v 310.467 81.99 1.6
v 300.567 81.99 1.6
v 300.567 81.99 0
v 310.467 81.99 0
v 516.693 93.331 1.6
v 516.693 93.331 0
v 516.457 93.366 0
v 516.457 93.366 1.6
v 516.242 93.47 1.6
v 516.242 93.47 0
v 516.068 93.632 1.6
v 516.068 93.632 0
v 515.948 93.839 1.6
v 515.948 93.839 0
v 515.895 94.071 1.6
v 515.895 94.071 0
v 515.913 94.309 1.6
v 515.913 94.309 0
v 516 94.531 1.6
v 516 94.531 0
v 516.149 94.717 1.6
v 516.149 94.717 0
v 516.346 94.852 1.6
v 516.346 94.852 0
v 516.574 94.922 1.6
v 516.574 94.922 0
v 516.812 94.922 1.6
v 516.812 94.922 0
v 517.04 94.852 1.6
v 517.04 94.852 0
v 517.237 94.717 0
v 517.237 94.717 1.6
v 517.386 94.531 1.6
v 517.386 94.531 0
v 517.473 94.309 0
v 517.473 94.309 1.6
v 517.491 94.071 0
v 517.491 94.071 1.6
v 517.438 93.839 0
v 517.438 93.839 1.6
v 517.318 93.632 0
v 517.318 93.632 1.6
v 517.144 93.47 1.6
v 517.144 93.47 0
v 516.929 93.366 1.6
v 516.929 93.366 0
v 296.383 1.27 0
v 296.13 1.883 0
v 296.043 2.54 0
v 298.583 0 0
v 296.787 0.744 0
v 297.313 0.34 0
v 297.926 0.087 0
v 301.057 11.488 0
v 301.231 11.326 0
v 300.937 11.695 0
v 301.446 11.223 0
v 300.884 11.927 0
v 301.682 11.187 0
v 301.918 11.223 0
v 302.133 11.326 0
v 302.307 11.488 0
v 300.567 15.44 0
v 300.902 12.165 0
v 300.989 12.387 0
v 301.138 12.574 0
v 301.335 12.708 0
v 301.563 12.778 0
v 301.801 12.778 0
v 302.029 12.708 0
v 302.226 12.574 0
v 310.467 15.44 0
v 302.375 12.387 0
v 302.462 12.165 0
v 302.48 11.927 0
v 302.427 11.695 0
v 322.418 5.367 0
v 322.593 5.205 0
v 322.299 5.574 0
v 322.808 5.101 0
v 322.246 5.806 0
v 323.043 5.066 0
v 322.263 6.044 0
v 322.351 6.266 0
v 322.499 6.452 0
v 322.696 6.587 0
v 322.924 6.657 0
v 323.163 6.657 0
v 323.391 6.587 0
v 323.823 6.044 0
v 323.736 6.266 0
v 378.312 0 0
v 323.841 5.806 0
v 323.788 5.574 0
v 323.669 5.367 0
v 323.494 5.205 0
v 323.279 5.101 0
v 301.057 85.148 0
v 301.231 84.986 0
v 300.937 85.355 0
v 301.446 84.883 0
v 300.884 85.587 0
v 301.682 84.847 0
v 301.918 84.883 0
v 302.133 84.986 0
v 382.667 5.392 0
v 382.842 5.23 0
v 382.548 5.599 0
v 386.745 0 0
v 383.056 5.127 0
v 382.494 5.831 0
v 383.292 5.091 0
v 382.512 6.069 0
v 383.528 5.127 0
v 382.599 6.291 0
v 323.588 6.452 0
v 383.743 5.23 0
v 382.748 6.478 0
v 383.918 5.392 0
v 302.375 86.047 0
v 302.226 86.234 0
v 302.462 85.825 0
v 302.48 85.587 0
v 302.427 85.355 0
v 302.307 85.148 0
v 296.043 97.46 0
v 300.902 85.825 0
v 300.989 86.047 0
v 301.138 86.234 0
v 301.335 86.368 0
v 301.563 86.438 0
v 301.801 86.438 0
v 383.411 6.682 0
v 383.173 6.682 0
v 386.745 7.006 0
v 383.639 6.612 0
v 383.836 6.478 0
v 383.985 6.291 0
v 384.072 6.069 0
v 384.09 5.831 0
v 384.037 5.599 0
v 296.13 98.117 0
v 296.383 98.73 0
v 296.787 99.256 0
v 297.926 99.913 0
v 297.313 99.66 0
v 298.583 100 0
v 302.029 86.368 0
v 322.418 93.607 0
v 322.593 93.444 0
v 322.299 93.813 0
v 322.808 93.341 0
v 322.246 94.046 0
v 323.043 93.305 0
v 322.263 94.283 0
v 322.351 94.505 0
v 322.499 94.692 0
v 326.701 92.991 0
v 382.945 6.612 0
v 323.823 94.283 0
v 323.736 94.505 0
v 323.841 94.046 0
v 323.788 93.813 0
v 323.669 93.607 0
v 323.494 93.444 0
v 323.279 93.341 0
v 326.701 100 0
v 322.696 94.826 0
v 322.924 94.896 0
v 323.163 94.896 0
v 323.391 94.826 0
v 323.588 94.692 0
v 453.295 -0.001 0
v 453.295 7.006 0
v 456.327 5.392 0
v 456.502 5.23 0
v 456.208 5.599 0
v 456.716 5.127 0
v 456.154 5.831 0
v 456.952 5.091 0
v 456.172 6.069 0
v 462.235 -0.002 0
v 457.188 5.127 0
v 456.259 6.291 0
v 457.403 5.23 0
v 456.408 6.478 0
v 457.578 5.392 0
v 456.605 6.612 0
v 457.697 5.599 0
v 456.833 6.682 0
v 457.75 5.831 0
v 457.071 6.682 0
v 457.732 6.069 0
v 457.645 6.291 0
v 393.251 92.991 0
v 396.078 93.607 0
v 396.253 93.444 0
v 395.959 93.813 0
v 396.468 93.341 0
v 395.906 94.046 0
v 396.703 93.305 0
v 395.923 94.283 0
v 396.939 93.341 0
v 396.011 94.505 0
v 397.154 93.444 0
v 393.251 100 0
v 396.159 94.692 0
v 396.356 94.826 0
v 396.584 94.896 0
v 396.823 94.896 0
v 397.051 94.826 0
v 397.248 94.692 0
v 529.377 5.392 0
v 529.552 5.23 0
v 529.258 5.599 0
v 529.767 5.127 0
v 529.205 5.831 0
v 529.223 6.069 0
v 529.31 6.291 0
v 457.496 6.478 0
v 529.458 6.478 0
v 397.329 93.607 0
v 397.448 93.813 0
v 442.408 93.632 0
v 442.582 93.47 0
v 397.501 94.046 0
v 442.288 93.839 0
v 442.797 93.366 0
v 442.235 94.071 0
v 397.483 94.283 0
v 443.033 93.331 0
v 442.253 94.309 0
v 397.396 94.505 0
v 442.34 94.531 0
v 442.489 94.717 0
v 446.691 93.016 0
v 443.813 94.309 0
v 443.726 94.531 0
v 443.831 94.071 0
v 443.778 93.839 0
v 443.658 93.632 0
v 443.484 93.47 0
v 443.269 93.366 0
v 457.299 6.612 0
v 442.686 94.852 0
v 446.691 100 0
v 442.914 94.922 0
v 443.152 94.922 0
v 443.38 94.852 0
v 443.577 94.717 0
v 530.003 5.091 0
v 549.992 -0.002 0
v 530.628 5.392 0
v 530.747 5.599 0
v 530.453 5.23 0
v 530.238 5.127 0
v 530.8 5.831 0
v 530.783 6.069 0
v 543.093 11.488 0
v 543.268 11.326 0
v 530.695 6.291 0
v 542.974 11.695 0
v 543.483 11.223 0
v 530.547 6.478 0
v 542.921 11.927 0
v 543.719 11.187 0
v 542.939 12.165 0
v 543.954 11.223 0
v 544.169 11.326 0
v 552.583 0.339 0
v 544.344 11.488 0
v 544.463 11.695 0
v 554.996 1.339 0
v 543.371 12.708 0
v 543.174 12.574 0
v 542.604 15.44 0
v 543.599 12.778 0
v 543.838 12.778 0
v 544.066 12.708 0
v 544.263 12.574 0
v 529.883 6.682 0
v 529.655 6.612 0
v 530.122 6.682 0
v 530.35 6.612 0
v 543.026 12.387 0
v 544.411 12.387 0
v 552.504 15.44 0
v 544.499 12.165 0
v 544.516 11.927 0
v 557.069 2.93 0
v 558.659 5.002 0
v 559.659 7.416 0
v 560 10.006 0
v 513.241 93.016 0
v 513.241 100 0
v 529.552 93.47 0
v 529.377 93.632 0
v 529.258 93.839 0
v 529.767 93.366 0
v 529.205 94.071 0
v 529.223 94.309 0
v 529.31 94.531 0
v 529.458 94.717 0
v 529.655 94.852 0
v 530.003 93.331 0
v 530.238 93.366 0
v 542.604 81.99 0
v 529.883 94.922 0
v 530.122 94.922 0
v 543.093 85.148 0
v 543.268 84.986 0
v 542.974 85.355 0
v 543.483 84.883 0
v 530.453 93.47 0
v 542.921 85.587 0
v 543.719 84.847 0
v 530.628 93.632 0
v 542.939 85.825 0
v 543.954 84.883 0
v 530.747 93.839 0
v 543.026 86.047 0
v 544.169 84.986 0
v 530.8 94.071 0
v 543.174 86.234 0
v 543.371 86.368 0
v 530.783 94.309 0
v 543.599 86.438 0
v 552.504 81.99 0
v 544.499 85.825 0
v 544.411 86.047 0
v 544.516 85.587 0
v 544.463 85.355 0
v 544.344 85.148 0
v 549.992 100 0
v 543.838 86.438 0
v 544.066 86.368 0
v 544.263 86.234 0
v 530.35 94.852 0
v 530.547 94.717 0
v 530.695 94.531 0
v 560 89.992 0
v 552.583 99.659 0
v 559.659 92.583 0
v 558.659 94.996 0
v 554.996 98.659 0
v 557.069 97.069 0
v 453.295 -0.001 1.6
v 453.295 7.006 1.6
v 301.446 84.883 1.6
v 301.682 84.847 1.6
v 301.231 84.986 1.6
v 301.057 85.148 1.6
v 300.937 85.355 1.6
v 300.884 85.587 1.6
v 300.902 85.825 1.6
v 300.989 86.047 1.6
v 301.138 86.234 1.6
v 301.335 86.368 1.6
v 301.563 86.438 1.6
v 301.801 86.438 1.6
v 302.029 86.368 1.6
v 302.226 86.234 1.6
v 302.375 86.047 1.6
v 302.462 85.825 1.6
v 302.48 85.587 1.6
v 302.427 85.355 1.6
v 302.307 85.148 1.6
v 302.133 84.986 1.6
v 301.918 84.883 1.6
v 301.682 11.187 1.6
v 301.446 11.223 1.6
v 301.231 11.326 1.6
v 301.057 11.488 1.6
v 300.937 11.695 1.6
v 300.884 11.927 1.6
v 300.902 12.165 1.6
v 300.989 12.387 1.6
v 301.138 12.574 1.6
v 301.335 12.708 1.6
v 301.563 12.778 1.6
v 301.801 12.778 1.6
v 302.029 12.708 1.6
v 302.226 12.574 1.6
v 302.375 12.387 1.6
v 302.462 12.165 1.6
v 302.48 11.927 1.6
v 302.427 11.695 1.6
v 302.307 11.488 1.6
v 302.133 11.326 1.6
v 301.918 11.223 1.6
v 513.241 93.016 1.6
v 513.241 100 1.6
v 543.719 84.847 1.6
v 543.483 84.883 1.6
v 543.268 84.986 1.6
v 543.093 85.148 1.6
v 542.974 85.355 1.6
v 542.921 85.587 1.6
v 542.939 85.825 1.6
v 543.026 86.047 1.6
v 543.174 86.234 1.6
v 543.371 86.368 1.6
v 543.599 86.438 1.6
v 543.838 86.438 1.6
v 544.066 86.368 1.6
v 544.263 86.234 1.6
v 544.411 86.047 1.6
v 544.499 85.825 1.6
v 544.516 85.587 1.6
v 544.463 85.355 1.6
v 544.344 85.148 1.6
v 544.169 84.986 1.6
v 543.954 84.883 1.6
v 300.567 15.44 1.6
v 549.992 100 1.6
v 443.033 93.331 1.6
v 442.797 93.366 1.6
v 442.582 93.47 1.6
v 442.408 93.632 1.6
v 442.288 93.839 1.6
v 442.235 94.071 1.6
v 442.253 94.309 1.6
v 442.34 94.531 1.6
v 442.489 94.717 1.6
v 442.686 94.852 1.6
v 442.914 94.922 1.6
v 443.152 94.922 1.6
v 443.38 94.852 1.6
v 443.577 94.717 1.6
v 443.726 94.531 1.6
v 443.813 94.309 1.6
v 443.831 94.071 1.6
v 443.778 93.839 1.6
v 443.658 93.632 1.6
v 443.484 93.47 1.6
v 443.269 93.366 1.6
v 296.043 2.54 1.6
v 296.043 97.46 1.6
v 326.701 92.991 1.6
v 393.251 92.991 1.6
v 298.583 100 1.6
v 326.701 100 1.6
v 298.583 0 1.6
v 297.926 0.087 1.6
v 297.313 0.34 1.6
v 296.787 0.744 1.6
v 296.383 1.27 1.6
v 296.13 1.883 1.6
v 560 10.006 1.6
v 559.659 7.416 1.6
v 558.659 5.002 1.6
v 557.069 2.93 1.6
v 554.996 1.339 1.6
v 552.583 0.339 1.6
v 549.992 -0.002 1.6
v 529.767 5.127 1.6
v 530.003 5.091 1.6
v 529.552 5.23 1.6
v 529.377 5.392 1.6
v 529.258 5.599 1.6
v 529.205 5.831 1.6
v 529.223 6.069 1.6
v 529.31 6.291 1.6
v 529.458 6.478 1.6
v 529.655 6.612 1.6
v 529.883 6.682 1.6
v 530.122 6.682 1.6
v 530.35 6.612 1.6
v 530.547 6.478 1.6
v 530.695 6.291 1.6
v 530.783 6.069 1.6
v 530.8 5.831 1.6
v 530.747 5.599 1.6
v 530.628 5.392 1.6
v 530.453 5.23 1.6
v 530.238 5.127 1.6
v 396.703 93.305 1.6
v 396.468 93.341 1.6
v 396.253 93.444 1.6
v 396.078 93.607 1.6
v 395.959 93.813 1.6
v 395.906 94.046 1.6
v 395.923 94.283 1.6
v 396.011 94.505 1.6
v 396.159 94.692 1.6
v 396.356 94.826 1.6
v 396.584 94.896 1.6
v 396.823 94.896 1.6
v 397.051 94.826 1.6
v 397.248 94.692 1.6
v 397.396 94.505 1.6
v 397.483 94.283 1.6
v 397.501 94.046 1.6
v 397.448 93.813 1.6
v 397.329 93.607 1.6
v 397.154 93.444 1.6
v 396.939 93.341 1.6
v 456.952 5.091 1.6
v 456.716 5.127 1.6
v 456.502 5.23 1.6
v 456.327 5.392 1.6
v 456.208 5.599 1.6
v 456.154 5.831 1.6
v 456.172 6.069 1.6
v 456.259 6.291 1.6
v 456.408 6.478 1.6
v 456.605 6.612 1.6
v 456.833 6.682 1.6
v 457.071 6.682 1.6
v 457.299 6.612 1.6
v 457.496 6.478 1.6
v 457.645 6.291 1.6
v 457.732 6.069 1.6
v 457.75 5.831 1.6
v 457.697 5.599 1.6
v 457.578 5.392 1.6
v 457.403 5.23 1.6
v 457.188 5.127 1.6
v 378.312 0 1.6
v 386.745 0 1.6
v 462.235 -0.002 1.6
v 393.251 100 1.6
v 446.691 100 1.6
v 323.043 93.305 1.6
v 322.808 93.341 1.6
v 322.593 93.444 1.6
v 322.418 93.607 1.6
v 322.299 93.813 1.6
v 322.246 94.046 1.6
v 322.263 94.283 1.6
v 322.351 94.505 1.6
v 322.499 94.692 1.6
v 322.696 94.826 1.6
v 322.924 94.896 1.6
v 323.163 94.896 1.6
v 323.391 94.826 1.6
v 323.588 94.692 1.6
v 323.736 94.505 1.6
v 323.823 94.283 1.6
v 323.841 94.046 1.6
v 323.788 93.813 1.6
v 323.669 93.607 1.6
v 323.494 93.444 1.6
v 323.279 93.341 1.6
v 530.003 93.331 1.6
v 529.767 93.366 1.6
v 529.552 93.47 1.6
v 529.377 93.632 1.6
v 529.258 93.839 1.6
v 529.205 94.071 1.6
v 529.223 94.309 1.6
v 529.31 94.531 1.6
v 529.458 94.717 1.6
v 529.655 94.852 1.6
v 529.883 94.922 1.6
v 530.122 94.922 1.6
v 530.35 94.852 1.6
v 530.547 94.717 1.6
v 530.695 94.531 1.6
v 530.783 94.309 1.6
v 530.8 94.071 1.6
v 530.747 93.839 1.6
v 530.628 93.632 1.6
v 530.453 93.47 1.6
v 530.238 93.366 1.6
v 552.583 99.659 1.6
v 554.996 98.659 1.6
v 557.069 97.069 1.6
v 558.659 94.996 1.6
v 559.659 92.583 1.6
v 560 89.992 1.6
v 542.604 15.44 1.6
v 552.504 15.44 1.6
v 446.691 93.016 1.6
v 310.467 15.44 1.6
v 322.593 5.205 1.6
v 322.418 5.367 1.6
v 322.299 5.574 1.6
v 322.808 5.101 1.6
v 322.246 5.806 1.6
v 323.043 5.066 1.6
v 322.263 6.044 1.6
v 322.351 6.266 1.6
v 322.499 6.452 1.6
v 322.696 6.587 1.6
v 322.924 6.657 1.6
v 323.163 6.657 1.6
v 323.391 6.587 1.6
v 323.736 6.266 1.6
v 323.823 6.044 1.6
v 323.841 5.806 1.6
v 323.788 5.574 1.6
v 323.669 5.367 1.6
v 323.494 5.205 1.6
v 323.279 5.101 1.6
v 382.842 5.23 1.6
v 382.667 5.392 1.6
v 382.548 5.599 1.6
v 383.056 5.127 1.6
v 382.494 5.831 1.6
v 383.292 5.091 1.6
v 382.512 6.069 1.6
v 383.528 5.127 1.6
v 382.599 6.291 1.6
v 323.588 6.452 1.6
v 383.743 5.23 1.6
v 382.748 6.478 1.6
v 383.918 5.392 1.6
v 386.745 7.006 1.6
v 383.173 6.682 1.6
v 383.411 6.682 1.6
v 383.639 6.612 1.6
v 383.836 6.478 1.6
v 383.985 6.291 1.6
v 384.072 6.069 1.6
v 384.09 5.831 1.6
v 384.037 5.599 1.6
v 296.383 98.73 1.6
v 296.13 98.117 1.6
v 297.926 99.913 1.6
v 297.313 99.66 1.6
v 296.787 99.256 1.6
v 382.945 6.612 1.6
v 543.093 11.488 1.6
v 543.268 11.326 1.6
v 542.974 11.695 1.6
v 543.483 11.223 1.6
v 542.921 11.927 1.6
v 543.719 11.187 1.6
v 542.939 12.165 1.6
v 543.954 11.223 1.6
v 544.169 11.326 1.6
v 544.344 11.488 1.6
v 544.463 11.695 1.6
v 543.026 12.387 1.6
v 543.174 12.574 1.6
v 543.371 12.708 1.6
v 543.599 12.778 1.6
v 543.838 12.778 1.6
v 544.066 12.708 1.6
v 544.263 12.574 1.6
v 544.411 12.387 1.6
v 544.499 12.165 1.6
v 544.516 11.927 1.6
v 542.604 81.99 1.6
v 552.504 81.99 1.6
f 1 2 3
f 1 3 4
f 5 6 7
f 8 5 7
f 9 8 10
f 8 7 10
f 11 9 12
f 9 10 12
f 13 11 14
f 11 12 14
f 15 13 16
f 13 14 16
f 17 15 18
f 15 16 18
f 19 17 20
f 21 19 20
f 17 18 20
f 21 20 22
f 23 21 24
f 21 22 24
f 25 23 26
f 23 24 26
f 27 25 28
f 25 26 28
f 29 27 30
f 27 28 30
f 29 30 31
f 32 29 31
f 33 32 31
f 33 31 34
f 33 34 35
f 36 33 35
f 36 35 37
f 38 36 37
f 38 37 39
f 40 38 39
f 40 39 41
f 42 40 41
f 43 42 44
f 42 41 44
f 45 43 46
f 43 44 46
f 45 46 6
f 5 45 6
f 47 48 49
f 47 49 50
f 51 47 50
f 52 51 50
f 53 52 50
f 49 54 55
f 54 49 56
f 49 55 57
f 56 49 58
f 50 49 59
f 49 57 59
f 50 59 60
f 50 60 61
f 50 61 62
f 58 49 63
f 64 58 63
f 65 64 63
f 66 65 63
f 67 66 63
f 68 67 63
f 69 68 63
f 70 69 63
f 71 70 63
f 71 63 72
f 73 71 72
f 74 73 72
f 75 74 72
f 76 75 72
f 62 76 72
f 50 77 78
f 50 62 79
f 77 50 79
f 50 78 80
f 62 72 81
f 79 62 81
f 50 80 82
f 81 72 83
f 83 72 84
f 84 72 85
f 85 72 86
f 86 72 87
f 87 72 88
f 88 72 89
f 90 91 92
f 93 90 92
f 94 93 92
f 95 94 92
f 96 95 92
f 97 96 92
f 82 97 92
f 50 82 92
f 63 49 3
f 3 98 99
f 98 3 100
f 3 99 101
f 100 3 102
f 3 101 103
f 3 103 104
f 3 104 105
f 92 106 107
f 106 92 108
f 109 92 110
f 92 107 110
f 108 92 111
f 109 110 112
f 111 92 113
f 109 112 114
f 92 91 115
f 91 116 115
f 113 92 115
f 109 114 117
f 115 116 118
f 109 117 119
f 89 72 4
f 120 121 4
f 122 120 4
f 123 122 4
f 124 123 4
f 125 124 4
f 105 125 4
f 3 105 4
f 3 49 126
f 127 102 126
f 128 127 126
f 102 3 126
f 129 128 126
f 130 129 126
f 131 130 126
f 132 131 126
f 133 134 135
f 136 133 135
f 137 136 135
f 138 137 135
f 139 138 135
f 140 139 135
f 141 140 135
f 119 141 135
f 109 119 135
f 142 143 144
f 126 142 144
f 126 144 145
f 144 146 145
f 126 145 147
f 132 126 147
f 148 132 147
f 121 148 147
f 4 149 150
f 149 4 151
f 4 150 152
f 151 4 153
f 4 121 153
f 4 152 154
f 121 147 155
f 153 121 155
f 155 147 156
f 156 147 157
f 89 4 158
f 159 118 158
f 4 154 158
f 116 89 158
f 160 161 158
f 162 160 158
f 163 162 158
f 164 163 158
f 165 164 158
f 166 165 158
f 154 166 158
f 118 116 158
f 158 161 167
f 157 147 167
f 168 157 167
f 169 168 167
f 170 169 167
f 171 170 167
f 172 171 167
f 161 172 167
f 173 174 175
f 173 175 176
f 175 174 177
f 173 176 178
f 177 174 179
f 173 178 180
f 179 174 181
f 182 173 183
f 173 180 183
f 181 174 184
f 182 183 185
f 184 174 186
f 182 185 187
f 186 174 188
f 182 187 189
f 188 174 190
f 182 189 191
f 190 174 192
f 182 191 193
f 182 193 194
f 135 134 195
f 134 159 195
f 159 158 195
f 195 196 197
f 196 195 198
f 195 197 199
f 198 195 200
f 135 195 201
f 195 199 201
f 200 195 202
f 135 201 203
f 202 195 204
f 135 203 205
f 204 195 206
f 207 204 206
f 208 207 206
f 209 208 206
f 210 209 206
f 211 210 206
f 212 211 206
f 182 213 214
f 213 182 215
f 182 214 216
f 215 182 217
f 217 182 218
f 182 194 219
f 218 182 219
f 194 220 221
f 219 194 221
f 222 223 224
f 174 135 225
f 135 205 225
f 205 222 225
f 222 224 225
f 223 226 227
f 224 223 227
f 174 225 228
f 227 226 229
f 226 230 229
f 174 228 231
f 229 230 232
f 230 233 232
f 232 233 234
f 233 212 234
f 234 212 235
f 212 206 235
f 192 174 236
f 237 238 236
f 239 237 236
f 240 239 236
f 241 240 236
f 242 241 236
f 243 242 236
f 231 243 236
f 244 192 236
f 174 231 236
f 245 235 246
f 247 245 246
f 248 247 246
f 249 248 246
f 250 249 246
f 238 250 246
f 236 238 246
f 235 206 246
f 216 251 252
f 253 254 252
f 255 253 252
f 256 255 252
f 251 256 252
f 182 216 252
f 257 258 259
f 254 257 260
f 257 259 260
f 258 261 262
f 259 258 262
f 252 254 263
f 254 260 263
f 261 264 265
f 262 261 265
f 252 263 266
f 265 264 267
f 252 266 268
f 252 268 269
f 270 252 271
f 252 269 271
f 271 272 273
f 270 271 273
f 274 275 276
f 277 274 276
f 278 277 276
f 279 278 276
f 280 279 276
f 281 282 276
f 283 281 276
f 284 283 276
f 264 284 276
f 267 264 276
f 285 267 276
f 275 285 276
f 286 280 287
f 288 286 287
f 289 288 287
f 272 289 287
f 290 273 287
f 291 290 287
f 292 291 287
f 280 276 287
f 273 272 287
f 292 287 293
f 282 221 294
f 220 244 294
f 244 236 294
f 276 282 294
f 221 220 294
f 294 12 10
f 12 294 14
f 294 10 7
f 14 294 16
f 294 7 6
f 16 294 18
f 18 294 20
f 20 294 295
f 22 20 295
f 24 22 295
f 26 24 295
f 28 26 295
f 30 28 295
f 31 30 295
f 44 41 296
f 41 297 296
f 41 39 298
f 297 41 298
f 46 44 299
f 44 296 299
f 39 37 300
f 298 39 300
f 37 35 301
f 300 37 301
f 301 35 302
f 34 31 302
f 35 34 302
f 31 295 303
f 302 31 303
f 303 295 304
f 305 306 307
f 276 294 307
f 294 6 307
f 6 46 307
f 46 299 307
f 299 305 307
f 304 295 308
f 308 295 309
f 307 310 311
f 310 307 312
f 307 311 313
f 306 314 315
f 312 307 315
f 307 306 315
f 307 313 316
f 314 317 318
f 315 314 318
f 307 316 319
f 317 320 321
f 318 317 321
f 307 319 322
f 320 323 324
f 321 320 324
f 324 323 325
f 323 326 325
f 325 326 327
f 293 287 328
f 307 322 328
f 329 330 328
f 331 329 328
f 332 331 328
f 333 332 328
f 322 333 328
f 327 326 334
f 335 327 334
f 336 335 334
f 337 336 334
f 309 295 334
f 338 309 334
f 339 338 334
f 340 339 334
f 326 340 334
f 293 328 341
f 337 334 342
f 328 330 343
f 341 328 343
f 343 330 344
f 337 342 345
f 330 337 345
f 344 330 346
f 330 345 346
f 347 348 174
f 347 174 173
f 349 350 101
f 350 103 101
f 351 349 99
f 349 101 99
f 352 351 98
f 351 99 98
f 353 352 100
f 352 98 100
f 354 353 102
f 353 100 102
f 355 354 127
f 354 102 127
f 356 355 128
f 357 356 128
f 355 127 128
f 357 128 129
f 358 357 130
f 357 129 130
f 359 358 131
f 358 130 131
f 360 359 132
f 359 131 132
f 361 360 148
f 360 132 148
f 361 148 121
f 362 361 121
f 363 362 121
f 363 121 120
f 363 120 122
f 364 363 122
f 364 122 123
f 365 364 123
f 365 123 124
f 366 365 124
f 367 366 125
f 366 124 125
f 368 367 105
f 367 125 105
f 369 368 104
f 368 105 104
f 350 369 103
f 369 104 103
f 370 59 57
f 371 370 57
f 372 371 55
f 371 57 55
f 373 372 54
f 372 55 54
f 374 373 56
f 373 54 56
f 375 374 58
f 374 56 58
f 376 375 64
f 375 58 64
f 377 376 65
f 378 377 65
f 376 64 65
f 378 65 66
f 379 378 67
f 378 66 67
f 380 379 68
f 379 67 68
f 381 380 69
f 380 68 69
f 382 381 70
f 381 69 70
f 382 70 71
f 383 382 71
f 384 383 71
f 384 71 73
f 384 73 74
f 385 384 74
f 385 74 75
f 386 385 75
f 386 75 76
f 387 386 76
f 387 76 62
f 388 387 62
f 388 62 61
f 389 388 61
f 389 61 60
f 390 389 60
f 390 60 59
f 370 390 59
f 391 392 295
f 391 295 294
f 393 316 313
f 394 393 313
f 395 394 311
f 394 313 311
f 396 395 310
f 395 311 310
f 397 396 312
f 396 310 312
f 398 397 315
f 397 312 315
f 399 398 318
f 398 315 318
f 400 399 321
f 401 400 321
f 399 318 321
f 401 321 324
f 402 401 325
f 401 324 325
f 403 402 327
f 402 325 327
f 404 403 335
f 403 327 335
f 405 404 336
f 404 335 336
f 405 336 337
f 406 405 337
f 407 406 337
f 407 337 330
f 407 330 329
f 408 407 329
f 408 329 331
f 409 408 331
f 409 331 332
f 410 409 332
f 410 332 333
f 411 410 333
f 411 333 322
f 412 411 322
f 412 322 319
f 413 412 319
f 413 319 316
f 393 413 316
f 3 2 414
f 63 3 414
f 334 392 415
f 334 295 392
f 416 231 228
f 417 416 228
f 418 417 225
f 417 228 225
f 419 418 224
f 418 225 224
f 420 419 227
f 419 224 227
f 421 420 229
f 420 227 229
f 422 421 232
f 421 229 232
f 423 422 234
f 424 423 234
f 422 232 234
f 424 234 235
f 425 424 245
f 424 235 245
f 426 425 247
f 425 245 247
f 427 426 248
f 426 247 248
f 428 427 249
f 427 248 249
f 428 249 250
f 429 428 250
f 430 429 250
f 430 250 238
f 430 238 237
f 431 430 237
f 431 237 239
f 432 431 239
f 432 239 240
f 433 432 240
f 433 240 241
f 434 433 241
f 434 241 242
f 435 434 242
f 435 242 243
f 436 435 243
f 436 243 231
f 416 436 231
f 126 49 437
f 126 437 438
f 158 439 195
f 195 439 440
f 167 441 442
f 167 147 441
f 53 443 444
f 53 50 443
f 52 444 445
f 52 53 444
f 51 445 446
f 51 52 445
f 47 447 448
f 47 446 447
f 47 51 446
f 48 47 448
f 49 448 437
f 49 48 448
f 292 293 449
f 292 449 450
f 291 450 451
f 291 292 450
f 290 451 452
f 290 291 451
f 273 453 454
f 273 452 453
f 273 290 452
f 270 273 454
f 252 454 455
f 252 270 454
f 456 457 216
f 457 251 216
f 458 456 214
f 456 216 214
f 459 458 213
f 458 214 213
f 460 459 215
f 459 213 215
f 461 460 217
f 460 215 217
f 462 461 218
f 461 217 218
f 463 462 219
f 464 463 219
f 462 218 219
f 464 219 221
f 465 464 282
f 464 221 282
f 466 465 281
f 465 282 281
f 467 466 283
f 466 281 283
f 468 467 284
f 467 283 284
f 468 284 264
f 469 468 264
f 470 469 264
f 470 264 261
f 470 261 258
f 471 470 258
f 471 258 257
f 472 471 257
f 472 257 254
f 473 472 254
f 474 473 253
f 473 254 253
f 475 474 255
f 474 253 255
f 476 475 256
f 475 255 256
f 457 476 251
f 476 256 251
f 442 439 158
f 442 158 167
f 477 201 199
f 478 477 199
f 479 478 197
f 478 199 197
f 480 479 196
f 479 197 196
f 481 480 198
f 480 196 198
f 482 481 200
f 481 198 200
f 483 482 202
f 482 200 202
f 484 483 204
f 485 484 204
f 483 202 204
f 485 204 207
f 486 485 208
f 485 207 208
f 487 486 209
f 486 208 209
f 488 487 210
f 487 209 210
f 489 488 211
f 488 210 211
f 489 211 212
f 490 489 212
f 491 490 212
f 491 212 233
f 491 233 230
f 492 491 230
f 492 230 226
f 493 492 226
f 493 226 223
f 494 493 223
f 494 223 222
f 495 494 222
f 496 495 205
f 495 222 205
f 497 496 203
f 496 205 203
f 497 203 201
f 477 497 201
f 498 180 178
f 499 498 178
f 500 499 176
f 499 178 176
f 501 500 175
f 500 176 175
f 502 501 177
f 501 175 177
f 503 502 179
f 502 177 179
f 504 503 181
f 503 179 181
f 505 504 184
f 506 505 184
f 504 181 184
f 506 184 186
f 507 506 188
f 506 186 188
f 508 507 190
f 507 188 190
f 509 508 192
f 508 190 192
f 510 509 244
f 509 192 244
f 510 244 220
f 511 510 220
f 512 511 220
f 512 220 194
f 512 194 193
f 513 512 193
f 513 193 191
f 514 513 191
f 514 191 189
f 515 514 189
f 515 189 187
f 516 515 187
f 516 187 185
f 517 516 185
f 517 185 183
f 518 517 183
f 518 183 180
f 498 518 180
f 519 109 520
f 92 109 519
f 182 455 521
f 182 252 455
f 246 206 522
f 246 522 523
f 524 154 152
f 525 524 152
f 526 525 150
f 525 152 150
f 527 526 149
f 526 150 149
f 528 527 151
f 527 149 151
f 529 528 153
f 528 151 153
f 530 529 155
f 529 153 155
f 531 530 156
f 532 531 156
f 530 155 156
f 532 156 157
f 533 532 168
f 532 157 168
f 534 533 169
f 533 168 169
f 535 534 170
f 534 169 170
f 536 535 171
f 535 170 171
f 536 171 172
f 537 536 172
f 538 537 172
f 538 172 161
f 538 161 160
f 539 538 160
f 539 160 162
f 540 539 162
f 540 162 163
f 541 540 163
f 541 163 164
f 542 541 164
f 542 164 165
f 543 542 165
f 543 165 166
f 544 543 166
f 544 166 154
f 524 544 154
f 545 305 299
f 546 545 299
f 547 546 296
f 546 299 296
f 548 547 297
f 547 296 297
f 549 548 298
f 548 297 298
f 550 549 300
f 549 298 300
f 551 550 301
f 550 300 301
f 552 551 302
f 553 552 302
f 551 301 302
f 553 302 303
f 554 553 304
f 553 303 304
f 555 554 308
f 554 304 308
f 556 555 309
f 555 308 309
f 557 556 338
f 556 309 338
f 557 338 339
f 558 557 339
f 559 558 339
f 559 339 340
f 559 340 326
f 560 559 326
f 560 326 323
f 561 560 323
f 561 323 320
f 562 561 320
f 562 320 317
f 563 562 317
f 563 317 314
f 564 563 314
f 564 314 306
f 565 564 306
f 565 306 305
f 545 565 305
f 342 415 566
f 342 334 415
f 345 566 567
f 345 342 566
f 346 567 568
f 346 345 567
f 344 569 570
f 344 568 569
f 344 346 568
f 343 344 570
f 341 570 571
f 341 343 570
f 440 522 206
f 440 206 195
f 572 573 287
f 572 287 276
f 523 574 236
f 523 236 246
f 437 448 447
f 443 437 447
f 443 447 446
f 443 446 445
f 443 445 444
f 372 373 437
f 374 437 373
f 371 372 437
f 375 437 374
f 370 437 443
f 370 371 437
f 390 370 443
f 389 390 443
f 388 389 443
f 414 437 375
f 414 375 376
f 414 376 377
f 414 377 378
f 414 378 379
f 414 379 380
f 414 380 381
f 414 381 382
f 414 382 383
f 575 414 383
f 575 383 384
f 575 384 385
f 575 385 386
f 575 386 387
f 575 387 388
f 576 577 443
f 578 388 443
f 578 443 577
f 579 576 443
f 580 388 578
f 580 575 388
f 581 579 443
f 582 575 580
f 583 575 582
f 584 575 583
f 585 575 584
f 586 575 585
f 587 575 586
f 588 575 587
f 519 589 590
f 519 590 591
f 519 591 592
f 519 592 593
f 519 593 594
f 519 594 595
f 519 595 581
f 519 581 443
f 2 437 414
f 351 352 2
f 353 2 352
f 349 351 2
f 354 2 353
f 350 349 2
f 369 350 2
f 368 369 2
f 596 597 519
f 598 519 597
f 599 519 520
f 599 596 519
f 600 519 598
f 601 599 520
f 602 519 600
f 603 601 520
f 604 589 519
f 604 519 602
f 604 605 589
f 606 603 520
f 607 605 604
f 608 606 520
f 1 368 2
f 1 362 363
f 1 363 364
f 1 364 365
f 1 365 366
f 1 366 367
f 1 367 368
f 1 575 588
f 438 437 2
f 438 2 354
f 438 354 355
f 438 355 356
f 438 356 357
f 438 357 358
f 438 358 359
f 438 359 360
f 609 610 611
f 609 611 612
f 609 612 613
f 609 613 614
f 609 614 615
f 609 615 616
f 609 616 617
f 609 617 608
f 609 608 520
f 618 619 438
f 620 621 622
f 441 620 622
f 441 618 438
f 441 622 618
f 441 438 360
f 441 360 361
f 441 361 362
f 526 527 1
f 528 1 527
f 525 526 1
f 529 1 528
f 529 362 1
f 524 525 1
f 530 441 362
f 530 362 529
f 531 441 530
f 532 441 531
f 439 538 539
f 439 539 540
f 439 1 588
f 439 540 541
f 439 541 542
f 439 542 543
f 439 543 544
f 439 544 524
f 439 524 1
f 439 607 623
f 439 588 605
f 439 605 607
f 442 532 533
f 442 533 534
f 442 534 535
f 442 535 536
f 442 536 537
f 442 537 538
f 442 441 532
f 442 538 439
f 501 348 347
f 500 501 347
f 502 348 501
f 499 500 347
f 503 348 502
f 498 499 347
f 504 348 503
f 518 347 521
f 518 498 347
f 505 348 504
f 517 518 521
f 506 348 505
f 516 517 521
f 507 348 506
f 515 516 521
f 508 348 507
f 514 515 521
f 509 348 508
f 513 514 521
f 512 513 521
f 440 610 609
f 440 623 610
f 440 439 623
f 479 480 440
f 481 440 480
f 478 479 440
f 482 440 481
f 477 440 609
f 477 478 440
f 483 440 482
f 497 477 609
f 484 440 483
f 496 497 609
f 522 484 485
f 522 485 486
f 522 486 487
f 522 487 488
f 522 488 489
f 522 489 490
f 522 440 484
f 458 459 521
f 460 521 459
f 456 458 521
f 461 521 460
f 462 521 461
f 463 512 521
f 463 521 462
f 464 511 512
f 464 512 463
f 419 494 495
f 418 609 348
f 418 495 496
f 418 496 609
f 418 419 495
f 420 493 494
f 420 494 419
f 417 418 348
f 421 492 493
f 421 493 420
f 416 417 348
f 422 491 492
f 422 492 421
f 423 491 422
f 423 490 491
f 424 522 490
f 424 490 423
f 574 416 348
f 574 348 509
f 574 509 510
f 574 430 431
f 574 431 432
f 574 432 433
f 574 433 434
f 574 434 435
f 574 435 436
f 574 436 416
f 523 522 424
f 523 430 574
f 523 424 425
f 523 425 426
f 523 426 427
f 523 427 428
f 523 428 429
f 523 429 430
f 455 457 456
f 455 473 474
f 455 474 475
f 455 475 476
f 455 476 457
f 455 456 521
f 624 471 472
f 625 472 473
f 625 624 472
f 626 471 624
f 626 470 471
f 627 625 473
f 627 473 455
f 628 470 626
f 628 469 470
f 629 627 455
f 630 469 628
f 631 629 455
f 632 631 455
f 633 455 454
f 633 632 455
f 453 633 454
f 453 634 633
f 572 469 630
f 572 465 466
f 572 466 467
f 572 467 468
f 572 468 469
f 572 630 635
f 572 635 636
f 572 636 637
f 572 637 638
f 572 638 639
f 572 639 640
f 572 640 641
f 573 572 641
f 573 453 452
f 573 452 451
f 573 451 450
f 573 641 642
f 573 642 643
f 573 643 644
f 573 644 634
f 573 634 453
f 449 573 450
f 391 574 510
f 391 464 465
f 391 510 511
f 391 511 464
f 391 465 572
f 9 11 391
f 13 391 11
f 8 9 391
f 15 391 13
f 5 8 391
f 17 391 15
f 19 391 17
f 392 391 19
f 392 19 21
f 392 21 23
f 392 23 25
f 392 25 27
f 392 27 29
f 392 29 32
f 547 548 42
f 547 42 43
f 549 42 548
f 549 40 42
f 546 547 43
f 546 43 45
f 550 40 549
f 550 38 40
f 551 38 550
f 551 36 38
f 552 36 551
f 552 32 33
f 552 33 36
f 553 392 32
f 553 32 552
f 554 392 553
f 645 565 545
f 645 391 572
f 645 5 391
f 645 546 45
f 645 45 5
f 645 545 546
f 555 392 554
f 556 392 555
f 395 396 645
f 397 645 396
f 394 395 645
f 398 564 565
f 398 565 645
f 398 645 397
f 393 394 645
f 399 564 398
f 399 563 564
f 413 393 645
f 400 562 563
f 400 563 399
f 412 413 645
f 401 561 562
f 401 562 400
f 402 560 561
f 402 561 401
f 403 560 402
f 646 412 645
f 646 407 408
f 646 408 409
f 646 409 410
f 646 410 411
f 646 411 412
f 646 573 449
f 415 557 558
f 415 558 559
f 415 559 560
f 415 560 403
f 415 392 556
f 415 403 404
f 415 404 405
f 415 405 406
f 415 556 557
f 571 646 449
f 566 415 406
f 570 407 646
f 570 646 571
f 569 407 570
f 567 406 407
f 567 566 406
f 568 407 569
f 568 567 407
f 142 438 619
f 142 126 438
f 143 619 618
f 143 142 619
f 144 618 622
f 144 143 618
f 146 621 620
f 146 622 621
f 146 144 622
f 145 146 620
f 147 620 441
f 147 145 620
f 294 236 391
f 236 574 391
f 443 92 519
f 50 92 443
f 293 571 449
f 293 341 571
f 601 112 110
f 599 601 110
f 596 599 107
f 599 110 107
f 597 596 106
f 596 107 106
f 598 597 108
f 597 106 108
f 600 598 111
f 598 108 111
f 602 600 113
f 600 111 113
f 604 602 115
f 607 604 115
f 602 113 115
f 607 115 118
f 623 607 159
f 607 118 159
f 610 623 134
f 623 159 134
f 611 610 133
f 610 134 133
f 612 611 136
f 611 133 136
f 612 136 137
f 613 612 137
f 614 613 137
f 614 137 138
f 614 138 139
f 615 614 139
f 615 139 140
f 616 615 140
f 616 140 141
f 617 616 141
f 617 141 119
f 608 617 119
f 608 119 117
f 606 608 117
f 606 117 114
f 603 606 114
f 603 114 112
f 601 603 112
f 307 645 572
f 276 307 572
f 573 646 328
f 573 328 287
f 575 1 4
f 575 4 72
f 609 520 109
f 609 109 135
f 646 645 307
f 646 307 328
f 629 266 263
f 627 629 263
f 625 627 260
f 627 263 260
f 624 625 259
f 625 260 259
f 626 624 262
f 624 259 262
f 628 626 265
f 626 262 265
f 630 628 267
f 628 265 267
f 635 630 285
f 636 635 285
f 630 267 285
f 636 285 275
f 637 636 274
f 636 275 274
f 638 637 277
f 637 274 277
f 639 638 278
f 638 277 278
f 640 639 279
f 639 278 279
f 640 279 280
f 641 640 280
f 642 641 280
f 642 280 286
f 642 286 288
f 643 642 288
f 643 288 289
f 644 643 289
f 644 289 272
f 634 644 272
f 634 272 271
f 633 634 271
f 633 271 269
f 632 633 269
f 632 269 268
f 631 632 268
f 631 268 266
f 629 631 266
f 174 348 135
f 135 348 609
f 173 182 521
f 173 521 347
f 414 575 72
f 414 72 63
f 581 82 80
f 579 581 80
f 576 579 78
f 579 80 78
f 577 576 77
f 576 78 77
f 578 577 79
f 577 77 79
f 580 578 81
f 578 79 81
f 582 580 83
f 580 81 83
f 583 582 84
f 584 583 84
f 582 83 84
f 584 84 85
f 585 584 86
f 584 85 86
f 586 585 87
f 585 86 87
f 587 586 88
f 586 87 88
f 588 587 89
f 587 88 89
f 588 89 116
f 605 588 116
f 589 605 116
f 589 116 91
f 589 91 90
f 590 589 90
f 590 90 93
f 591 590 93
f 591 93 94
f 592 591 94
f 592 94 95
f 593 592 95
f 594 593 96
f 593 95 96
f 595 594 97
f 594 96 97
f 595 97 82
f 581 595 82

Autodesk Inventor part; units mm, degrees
ref_plane "YZ Plane" through (0, 0, 0) normal (1, 0, 0) x (0, 1, 0)
ref_plane "XZ Plane" through (0, 0, 0) normal (0, 1, 0) x (-1, 0, 0)
ref_plane "XY Plane" through (0, 0, 0) normal (0, 0, 1) x (1, 0, 0)
ref_plane "Work Plane1" through (280, 50, 0) normal (0, 0, 1) x (1, 0, 0)
sketch "Sketch3" plane through (280, 50, 0) normal (0, 0, 1) x (1, 0, 0)
  line L0 (280, 39.9924) -> (280, 21.7788) projected
  line L1 (280, 21.7788) -> (280, -15.0258) projected
  line L2 (280, -15.0258) -> (280, -34.9902) projected
  line L3 (280, -34.9902) -> (280, -39.994) projected
  arc A0 (269.9924, -50.0016) -> (280, -39.994) centre (269.9924, -39.994) ccw projected
  arc A1 (280, 39.9924) -> (269.9924, 50) centre (269.9924, 39.9924) ccw projected
  line L4 (242.662, 50) -> (269.9924, 50) projected
  line L5 (269.9924, -50.0016) -> (261.331, -50.0016) projected
  line L6 (261.331, -50.0016) -> (182.2354, -50.0016) projected
  line L7 (98.3122, -50) -> (22.952, -50) projected
  arc A2 (16.0432, -47.46) -> (18.5832, -50) centre (18.5832, -47.46) ccw projected
  line L8 (22.952, -50) -> (18.5832, -50) projected
  line L9 (16.0432, -47.46) -> (16.0432, 32.1674) projected
  line L10 (16.0432, 32.1674) -> (16.0432, 47.46) projected
  arc A3 (18.5832, 50) -> (16.0432, 47.46) centre (18.5832, 47.46) ccw projected
  line L11 (18.5832, 50) -> (37.762, 50) projected
  line L12 (121.9848, 50) -> (155.413, 50) projected
  line L13 (121.9848, 50) -> (37.762, 50)
  line L14 (155.413, 50) -> (242.662, 50)
  line L15 (182.2354, -50.0016) -> (97.9077, -50)
  point P0 (-280, -50)
extrude "Extrusion2" add sketch "Sketch3" along normal blind 1.6
sketch "Sketch5" plane through (280, 50, 1.6) normal (0, 0, 1) x (1, 0, 0)
  circle A0 centre (263.7186, 35.6472) radius 1.75 projected
  circle A1 centre (250.0026, 44.1308) radius 1.75 projected
  circle A2 centre (263.7186, -38.0128) radius 1.75 projected
  circle A3 centre (250.0026, -44.1088) radius 1.75 projected
  circle A4 centre (176.9522, -44.1088) radius 1.75 projected
  circle A5 centre (163.033, 44.1308) radius 1.75 projected
  circle A6 centre (116.7034, 44.1054) radius 1.75 projected
  circle A7 centre (103.2922, -44.1088) radius 1.75 projected
  circle A8 centre (43.0434, -44.1342) radius 1.75 projected
  circle A9 centre (43.0434, 44.1054) radius 1.75 projected
  circle A10 centre (21.682, 35.6472) radius 1.75 projected
  circle A11 centre (21.682, -38.0128) radius 1.75 projected
  circle A12 centre (236.693, 44.1308) radius 1.75 projected
  point P0 (-280, -50)
hole "Hole1" at (530.0026, 94.1308, 1.6) at (516.693, 94.1308, 1.6) at (543.7186, 85.6472, 1.6) at (543.7186, 11.9872, 1.6) at (530.0026, 5.8912, 1.6) at (443.033, 94.1308, 1.6) at (456.9522, 5.8912, 1.6) at (383.2922, 5.8912, 1.6) at (396.7034, 94.1054, 1.6) at (323.0434, 94.1054, 1.6) at (301.682, 85.6472, 1.6) at (323.0434, 5.8658, 1.6) at (301.682, 11.9872, 1.6) direction (0, 0, -1) diameter 1.6 depth 8 tip angle 118
sketch "Sketch6" plane through (280, 50, 1.6) normal (0, 0, 1) x (1, 0, 0)
  line L0 (262.604, 31.9897) -> (272.504, 31.9897) projected
  line L1 (262.604, 31.9897) -> (262.604, -34.5603) projected
  line L2 (272.504, -34.5603) -> (262.604, -34.5603) projected
  line L3 (173.2947, -42.9941) -> (173.2947, -52.8941) projected
  line L4 (173.2947, -42.9941) -> (106.7447, -42.9941) projected
  line L5 (106.7447, -52.8941) -> (106.7447, -42.9941) projected
  line L6 (30.4674, -34.5603) -> (20.5674, -34.5603) projected
  line L7 (30.4674, 31.9897) -> (30.4674, -34.5603) projected
  line L8 (20.5674, 31.9897) -> (30.4674, 31.9897) projected
  line L9 (46.7009, 42.9907) -> (46.7009, 52.8907) projected
  line L10 (46.7009, 42.9907) -> (113.2509, 42.9907) projected
  line L11 (113.2509, 52.8907) -> (113.2509, 42.9907) projected
  line L12 (166.6906, 43.0161) -> (166.6906, 52.9161) projected
  line L13 (166.6906, 43.0161) -> (233.2406, 43.0161) projected
  line L14 (233.2406, 52.9161) -> (233.2406, 43.0161) projected
  line L15 (166.6906, 52.9161) -> (233.2406, 52.9161) projected
  line L16 (46.7009, 52.8907) -> (113.2509, 52.8907) projected
  line L17 (20.5674, 31.9897) -> (20.5674, -34.5603) projected
  line L18 (173.2947, -52.8941) -> (106.7447, -52.8941) projected
  line L19 (272.504, 31.9897) -> (272.504, -34.5603) projected
  point P0 (-280, -50)
extrude "Extrusion3" cut sketch "Sketch6" against normal blind 1.6
properties part number "Spacing Layer 3" material "PC/ABS Plastic"
